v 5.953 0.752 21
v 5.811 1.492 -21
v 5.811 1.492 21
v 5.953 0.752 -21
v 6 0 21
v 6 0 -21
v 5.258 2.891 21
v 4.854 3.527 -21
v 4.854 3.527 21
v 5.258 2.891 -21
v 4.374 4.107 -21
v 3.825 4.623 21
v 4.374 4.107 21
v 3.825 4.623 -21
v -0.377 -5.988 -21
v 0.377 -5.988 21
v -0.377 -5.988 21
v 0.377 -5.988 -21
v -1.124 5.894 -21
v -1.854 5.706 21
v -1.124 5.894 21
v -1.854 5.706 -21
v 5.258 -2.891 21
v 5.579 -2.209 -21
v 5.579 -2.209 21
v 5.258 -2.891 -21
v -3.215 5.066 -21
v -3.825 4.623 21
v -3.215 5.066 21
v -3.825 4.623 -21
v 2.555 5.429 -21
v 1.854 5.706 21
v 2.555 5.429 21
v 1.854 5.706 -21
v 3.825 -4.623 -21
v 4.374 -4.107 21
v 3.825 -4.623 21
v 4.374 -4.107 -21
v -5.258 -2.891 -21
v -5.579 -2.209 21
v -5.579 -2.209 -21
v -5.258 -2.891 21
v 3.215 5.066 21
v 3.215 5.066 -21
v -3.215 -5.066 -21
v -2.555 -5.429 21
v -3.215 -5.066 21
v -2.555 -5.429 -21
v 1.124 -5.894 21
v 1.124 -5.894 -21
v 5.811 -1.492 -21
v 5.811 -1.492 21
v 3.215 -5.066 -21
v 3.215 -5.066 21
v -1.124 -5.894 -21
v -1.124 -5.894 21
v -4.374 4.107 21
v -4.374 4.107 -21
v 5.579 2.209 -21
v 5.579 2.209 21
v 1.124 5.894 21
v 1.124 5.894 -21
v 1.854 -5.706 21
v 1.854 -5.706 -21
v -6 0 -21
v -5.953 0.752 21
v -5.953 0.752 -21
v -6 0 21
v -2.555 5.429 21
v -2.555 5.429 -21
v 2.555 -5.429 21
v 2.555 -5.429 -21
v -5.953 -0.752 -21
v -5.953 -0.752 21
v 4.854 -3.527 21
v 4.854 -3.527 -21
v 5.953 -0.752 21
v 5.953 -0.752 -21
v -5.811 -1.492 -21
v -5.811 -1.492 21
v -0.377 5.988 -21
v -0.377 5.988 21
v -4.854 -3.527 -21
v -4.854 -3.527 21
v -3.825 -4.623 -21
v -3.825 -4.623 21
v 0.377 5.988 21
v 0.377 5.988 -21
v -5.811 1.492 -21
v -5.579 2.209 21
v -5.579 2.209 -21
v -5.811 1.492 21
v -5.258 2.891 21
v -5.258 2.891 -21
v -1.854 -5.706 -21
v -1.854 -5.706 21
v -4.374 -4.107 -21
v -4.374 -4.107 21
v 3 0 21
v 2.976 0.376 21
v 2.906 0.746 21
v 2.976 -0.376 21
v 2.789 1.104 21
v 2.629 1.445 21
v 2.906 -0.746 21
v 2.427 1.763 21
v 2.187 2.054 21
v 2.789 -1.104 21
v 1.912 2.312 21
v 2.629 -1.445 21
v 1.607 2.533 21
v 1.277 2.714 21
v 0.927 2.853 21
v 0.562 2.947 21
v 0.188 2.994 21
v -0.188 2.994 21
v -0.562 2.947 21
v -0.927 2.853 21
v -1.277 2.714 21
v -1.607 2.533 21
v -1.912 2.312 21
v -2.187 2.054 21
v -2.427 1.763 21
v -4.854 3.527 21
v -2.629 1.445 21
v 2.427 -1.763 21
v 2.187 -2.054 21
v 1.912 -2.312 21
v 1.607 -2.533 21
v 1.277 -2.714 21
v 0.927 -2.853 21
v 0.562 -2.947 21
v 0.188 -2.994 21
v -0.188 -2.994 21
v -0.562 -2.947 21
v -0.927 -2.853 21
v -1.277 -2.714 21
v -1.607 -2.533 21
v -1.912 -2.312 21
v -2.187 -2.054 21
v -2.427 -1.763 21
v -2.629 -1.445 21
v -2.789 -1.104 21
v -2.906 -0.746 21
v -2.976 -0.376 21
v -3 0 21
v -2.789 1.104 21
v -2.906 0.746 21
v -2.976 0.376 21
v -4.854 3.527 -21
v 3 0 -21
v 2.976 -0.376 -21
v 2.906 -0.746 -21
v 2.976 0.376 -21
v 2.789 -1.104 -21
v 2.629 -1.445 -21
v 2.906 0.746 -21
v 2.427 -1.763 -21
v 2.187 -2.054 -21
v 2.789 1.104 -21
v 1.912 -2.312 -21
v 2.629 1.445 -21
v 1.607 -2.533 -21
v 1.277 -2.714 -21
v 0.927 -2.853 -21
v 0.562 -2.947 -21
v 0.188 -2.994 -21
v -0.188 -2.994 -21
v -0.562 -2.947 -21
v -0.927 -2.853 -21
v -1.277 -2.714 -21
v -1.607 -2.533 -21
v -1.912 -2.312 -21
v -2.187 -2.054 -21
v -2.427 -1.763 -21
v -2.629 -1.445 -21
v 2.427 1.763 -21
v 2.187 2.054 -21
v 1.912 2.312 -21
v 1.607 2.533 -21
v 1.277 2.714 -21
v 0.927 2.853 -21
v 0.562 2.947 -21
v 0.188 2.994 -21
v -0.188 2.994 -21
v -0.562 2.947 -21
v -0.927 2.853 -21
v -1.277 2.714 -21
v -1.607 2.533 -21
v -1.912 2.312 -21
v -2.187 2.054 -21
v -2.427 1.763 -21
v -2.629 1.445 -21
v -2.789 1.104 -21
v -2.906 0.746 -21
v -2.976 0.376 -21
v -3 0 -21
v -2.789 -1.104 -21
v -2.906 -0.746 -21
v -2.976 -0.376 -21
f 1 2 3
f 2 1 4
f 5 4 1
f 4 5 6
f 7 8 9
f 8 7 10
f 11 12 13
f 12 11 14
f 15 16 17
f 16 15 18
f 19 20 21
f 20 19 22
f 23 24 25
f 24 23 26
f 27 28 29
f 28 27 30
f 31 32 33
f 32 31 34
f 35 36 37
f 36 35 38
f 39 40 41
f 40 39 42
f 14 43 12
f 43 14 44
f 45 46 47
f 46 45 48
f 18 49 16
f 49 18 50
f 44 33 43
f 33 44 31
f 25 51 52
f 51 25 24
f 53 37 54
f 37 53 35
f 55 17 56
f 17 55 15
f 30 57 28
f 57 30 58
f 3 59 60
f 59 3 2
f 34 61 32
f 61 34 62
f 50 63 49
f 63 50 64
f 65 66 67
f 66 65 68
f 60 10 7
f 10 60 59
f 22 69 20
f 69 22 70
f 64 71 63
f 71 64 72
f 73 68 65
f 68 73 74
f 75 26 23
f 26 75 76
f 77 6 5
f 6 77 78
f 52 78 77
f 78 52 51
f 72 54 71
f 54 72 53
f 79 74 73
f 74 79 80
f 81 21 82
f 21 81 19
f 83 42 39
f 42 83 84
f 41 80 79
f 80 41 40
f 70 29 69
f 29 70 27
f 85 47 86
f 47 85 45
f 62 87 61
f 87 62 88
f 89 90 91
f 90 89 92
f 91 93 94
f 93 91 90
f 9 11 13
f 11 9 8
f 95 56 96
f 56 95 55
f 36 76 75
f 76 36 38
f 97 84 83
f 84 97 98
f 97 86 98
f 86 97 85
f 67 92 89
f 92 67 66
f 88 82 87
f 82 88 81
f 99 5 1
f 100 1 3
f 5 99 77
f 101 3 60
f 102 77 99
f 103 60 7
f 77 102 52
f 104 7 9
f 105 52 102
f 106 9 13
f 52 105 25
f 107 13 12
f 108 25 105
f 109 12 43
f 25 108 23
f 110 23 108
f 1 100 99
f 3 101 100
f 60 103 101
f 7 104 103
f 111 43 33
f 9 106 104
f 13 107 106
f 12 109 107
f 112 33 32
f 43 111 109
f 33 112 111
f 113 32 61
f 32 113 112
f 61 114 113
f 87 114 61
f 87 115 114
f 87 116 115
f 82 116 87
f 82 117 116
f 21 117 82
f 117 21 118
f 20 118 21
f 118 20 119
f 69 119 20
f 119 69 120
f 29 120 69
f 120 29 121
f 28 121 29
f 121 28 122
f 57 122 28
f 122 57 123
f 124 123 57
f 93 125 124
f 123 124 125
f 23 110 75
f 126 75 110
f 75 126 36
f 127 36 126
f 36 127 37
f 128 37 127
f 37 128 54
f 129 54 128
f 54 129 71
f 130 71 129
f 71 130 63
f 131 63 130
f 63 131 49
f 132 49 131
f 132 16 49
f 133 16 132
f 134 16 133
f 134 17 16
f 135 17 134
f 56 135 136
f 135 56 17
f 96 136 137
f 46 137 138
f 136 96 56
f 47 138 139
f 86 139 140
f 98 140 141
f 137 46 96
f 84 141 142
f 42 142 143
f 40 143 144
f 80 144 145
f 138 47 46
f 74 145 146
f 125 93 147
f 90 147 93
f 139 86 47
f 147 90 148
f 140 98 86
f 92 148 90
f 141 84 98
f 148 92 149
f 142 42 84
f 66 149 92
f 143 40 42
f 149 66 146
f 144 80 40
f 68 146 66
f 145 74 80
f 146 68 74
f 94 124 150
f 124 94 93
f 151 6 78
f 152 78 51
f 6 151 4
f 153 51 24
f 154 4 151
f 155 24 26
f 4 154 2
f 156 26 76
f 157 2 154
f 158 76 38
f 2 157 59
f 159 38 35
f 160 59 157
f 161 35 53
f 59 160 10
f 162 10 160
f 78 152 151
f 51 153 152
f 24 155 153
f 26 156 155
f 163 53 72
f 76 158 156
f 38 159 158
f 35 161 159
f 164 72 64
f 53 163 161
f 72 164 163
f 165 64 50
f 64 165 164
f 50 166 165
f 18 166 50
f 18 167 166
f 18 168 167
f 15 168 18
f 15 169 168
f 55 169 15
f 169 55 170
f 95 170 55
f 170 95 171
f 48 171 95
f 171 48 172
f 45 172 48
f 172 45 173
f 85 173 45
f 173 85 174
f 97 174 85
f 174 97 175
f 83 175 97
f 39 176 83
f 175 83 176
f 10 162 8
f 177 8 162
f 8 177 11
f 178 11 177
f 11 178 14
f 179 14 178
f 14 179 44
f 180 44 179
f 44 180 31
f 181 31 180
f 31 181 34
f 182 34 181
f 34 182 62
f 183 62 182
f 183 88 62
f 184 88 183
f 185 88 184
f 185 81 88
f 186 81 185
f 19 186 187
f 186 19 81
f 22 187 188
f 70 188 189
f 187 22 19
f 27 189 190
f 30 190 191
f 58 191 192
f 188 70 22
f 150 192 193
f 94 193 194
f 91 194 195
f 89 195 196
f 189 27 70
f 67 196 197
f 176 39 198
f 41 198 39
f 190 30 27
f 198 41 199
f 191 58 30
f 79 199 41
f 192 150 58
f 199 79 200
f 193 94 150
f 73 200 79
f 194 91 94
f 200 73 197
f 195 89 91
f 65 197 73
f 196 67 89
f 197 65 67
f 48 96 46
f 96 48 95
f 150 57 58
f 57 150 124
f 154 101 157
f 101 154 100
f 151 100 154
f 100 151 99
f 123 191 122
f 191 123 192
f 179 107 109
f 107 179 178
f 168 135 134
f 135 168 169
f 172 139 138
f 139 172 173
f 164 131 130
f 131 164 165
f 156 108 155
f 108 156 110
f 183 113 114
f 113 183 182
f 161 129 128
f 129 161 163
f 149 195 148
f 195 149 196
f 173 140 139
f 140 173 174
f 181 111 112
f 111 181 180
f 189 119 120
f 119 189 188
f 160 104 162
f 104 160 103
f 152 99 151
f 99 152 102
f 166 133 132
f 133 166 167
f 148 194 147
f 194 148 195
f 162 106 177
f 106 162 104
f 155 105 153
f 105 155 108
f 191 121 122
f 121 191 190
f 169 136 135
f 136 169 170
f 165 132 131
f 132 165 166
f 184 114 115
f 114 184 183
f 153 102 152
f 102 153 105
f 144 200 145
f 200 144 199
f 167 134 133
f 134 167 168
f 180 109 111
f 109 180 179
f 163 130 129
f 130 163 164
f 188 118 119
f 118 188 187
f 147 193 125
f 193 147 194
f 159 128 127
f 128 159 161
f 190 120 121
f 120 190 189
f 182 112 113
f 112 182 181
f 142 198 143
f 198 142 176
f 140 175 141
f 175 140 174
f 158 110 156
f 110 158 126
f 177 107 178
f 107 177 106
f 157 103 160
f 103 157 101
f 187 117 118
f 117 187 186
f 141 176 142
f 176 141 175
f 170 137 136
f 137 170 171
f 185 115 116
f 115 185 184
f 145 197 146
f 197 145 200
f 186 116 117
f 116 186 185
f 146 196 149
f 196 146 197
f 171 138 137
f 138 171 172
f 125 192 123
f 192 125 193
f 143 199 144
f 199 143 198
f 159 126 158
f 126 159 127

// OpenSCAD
$fn = 50;


difference() {
	union() {
		translate(v = [0, 0, -21.0000000000]) {
			cylinder(h = 42, r = 6.0000000000);
		}
	}
	union() {
		translate(v = [0, 0, -100.0000000000]) {
			cylinder(h = 200, r = 3.0000000000);
		}
	}
}
